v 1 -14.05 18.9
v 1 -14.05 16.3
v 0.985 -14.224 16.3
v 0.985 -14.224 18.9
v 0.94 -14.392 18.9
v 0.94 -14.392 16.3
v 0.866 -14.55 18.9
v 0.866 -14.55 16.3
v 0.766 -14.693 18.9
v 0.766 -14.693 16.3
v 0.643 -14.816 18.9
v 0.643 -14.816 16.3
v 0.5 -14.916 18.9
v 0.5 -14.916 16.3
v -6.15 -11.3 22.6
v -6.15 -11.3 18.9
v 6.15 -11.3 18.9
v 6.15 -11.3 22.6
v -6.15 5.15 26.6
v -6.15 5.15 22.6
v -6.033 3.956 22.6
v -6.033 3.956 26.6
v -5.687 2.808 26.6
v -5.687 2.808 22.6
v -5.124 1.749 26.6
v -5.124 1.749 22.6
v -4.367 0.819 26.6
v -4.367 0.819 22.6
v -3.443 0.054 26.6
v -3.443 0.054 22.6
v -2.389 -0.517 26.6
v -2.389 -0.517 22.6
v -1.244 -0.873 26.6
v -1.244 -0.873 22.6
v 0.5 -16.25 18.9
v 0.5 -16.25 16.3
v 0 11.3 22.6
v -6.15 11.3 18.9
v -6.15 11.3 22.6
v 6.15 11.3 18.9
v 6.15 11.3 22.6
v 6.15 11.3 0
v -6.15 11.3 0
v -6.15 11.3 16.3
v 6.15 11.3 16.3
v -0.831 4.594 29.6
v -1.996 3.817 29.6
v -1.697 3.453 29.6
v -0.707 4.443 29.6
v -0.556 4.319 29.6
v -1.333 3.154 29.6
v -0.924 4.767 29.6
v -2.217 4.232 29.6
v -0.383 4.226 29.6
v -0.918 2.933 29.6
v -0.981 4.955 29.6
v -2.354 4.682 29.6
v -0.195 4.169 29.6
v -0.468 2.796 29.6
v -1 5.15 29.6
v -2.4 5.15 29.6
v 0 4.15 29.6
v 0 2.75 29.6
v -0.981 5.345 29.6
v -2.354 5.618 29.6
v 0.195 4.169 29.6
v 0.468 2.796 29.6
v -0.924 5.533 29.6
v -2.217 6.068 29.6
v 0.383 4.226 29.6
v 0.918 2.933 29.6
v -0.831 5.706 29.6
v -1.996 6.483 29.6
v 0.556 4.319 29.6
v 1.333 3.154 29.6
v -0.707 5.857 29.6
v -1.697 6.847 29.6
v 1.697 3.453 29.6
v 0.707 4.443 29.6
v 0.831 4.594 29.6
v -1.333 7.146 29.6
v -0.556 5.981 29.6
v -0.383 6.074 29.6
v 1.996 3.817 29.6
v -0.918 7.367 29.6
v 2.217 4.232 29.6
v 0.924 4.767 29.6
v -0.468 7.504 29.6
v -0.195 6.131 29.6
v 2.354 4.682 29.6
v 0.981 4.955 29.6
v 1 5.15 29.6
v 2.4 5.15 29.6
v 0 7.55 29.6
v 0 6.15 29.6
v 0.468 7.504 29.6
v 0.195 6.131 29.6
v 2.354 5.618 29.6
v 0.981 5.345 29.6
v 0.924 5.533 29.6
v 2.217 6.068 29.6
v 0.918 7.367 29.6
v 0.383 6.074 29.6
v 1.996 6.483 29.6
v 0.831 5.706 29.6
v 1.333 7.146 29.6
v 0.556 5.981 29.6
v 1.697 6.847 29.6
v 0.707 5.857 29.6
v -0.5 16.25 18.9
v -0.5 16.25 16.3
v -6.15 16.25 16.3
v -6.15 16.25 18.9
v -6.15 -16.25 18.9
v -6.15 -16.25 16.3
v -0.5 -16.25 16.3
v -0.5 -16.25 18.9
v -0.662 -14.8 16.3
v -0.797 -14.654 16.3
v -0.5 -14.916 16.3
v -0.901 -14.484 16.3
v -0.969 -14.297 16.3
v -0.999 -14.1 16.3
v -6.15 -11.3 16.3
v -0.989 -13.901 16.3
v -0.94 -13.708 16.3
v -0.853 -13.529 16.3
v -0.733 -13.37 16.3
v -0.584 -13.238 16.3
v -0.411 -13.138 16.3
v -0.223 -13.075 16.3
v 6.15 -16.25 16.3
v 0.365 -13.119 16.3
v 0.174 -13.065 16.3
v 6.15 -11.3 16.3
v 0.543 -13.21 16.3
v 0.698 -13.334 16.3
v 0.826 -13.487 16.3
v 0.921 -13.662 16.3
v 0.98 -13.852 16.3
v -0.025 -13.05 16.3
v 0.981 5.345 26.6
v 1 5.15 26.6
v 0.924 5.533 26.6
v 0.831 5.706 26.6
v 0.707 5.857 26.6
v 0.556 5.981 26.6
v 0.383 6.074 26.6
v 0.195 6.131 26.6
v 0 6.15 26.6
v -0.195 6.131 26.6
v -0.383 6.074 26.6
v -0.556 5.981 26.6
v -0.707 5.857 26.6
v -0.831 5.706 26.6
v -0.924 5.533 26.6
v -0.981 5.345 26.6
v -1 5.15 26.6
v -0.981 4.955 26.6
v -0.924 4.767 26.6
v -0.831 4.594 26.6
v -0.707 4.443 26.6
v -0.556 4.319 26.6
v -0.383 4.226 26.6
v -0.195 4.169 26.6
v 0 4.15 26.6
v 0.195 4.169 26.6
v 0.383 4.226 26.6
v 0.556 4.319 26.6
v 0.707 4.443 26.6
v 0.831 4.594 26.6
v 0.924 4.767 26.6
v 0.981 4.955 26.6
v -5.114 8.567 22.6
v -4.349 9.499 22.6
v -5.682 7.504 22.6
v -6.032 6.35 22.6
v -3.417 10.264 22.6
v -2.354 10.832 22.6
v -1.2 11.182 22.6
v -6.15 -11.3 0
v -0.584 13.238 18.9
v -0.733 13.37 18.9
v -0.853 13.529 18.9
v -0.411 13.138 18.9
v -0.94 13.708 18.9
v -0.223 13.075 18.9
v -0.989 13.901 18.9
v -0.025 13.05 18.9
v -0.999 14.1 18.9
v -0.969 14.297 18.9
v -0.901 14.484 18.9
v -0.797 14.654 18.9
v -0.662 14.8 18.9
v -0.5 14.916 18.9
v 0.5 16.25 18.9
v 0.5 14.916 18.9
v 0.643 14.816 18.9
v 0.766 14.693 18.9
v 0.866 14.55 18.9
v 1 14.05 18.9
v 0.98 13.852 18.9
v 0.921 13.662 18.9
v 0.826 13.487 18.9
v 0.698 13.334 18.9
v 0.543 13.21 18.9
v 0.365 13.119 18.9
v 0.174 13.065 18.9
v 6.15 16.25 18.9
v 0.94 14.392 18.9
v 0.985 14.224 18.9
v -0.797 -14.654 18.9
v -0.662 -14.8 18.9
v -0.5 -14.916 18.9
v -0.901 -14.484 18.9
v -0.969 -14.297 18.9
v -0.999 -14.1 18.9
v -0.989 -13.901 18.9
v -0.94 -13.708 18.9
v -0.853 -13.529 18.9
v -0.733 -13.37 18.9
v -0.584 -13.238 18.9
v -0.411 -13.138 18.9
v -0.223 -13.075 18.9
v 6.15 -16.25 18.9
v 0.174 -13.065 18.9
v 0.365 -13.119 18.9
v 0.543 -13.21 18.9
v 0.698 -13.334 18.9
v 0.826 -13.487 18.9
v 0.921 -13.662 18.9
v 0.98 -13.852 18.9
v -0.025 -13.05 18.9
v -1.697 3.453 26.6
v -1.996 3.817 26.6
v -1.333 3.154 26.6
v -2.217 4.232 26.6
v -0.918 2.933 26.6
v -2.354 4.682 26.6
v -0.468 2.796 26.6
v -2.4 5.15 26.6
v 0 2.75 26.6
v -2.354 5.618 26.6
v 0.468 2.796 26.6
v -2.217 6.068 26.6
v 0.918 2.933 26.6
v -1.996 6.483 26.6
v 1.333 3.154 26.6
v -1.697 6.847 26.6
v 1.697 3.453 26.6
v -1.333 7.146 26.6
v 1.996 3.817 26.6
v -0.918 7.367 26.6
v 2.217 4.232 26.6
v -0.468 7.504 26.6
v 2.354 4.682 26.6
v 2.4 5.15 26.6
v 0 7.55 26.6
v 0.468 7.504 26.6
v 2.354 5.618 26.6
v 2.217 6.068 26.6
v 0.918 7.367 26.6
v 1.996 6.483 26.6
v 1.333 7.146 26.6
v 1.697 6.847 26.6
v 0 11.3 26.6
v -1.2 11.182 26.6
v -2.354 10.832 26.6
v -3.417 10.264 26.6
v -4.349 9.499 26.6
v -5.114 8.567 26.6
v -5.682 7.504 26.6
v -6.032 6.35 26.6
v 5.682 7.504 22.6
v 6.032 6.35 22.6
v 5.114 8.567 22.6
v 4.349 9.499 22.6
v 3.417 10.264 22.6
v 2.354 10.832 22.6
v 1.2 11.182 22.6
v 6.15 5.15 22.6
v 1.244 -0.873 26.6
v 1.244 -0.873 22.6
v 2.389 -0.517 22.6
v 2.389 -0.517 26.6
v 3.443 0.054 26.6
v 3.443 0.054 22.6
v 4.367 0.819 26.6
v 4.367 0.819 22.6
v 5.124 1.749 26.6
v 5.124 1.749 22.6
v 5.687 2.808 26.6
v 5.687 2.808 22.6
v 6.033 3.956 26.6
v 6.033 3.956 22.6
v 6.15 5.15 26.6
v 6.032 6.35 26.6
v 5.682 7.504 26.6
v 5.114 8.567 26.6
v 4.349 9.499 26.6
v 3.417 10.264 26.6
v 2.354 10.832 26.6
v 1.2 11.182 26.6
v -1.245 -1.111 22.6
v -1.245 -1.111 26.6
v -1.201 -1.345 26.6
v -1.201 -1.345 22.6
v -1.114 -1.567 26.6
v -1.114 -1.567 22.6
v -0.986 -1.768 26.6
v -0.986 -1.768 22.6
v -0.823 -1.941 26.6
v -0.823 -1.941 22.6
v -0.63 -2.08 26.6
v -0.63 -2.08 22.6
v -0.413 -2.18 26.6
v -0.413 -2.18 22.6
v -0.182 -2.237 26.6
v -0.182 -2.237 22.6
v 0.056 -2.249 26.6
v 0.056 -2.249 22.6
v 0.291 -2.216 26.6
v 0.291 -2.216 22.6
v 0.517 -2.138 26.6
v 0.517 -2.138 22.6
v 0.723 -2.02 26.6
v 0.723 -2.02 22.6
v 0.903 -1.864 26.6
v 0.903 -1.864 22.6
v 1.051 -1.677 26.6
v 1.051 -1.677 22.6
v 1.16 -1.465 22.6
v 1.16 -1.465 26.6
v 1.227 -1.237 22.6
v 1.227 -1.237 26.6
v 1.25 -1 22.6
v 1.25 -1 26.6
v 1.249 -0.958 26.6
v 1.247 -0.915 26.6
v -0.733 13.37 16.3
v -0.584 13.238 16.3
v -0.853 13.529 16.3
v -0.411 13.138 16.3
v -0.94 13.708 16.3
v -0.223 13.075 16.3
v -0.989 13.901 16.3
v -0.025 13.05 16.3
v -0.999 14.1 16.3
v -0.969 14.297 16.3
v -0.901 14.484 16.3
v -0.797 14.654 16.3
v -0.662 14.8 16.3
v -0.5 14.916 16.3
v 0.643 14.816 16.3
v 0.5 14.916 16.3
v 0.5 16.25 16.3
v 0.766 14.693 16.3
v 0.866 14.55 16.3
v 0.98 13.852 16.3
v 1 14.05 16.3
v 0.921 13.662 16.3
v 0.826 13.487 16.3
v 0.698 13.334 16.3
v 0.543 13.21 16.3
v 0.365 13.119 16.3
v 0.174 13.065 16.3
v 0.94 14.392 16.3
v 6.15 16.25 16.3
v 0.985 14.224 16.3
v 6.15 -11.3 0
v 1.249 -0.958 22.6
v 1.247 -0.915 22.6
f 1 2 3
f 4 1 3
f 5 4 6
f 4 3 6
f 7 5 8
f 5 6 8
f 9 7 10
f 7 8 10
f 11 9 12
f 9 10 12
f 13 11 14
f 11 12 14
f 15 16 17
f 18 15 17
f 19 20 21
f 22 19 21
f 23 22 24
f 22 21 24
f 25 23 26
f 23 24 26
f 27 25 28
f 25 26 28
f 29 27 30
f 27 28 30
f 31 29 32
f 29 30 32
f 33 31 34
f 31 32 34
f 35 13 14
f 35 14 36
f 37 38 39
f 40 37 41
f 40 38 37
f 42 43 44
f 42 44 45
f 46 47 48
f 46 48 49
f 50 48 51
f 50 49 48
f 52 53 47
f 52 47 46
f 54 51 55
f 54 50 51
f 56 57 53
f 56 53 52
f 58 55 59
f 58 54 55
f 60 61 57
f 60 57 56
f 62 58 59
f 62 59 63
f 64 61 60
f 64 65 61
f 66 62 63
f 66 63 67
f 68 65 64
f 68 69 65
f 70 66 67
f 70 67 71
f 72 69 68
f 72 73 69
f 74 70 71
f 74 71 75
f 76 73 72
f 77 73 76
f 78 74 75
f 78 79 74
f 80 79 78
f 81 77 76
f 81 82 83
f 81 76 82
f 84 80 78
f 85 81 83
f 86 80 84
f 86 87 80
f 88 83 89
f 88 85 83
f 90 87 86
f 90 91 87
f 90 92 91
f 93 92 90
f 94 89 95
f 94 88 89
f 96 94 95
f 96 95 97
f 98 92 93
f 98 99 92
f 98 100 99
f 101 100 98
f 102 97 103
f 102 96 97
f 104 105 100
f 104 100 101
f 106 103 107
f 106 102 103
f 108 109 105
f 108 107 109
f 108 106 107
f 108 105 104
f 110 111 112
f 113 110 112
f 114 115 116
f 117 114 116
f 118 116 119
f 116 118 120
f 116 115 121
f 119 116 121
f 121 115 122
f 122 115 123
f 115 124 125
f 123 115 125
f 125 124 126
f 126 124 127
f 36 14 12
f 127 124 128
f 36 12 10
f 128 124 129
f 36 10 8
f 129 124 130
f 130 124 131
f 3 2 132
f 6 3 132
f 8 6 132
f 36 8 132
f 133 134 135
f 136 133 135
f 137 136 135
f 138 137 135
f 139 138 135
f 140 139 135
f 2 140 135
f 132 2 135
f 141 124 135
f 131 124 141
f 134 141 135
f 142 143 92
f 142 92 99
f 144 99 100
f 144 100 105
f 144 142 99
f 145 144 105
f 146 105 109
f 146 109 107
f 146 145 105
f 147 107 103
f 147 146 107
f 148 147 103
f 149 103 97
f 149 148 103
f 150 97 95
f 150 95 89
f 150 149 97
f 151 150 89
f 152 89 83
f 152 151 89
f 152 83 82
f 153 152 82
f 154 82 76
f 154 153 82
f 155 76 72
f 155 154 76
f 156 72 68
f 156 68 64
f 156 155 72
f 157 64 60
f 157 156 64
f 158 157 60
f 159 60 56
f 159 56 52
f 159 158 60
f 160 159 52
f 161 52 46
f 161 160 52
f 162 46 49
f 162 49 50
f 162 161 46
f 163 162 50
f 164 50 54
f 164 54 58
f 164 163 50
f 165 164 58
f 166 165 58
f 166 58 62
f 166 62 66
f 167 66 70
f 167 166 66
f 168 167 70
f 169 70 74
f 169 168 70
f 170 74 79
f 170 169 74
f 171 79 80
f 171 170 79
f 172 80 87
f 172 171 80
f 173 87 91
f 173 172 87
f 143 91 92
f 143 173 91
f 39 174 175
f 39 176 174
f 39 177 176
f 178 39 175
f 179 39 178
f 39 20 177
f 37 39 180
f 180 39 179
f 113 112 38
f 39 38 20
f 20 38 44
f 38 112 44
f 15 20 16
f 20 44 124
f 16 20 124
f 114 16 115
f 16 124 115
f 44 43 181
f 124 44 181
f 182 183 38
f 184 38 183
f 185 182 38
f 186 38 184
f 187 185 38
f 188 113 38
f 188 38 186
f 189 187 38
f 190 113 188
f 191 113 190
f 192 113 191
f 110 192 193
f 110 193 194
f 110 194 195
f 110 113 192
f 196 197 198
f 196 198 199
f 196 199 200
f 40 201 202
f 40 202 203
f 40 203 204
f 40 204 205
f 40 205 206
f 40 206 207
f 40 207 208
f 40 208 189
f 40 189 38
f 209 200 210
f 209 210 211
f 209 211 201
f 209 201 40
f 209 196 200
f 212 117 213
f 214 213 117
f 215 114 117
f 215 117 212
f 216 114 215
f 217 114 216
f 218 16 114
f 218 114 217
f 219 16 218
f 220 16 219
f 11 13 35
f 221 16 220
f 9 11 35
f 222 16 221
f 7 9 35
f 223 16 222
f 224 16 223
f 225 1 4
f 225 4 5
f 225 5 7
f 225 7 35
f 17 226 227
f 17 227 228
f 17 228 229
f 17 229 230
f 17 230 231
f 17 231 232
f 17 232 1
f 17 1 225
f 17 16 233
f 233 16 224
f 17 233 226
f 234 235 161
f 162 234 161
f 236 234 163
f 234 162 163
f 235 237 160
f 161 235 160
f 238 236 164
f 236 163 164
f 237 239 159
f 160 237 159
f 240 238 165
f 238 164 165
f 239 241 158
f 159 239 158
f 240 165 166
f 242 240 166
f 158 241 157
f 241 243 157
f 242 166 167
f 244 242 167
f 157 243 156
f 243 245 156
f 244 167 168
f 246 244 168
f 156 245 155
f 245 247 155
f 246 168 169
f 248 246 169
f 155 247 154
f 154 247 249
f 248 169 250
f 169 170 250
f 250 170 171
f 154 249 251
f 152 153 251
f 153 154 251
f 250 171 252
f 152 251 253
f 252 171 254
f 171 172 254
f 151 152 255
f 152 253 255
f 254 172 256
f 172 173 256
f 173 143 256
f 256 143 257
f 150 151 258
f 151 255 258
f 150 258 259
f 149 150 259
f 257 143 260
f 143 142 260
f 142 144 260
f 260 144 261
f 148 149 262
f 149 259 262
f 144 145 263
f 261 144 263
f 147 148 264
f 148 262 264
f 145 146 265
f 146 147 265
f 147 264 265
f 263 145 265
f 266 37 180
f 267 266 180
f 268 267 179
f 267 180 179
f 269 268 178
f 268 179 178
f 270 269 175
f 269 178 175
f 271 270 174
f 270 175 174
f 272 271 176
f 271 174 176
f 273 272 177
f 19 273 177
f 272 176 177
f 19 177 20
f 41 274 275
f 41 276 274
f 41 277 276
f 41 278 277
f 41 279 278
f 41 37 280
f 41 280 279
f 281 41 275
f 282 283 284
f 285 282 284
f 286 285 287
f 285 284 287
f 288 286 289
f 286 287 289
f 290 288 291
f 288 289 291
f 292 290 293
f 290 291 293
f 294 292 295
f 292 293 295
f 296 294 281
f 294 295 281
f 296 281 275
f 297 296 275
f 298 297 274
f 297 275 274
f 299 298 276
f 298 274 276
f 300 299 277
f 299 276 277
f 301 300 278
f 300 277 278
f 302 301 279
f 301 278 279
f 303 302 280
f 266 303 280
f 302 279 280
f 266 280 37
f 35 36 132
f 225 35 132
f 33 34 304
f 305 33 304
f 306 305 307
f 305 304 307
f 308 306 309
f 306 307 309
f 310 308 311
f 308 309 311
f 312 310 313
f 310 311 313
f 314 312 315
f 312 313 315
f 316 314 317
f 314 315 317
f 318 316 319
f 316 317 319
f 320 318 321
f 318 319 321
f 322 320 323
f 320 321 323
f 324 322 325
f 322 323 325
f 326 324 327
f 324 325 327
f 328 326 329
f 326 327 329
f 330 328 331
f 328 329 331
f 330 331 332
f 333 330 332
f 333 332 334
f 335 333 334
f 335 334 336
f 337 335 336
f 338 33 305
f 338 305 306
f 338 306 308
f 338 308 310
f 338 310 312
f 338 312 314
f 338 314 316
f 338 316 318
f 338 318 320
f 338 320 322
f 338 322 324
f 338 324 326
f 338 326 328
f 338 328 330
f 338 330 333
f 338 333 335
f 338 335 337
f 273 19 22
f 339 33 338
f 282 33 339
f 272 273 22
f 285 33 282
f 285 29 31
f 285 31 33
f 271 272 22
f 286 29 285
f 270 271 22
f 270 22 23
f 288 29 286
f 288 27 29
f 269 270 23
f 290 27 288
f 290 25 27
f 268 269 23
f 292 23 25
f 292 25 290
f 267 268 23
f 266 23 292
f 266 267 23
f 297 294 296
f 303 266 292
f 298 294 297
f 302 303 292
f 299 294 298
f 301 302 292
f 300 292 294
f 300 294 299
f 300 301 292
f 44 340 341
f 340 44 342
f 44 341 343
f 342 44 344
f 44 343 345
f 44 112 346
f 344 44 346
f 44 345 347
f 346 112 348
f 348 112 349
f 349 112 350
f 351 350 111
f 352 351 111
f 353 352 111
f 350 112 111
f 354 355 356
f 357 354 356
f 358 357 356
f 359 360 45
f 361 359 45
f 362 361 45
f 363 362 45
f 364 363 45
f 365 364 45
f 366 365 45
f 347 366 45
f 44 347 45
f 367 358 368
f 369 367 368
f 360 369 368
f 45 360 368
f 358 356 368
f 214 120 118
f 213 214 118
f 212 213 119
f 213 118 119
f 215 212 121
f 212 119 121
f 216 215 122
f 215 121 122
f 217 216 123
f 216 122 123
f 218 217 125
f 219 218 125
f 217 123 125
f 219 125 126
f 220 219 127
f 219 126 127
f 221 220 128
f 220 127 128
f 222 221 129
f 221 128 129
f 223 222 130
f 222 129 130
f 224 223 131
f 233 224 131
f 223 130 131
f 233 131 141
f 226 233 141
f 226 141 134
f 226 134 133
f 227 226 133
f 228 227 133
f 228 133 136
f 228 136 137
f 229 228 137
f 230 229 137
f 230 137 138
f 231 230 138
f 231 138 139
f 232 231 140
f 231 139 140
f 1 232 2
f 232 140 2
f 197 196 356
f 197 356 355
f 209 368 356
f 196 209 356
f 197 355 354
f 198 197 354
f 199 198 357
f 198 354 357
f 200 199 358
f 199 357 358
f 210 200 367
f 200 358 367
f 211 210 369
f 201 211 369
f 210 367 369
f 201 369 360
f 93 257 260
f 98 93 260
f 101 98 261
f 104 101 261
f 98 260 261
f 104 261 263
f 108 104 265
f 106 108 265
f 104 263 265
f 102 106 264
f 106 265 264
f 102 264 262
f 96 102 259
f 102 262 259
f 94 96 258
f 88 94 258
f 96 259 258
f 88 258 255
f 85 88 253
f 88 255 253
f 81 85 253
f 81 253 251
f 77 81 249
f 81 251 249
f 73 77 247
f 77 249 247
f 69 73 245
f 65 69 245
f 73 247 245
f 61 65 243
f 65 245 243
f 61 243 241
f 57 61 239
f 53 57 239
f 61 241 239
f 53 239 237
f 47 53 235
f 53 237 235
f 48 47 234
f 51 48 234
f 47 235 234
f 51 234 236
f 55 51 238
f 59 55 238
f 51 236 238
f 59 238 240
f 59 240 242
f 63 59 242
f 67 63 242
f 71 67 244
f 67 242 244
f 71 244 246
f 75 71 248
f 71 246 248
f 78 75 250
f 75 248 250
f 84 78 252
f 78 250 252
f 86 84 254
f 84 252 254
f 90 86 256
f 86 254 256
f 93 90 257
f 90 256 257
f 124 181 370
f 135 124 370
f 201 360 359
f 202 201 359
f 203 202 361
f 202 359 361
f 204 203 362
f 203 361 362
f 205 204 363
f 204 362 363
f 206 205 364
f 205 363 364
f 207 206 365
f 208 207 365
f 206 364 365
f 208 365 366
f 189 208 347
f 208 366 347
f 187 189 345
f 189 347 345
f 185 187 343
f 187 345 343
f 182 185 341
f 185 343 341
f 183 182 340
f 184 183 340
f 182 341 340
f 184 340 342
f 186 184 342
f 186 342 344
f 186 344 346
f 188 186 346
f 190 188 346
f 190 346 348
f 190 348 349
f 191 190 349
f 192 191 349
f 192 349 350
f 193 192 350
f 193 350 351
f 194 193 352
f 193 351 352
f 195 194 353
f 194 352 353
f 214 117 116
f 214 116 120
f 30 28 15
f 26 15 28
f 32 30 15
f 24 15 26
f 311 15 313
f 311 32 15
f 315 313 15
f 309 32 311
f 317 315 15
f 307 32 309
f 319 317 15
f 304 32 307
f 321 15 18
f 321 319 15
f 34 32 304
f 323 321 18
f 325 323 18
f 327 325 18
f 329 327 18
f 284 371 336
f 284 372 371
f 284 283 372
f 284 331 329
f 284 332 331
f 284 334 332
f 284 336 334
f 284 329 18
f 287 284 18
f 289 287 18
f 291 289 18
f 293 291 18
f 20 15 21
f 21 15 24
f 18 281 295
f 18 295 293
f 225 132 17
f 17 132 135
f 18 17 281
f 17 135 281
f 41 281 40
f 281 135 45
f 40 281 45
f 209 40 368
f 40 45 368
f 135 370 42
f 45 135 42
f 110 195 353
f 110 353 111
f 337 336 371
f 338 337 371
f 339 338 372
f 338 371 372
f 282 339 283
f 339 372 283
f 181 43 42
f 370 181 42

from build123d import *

# Parameters (mm, degrees)
F0_W     = 12.3
F0_H     = 22.6
F1_DEPTH = 16.3
F2_W     = 12.3
F2_H     = 22.6
F3_DEPTH = 2.6
F4_W     = 12.3
F4_H     = 22.6
F5_DEPTH = 3.7
F7_DEPTH = 4
F8_R     = 2.4
F8_R_2   = 1
F9_DEPTH = 3


with BuildPart() as f1:
    # F0 (on Top) → F1 (new body)
    with BuildSketch(Plane.XY):
        Rectangle(F0_W, F0_H)
    extrude(amount=F1_DEPTH)

    # F2 (on face) → F3 (join)
    with BuildSketch(Plane.XY.offset(16.3)):
        with BuildLine():
            Line((-6.15, 16.25), (-6.15, 11.3))
            Line((-6.15, 11.3), (6.15, 11.3))
            Line((6.15, 11.3), (6.15, 16.25))
            Line((6.15, 16.25), (0.5, 16.25))
            Line((0.5, 16.25), (0.5, 14.9160254038))
            ThreePointArc((0.5, 14.9160254038), (0.8660254038, 14.55), (1, 14.05))
            ThreePointArc((1, 14.05), (-0.5, 13.1839745962), (-0.5, 14.9160254038))
            Line((-0.5, 14.9160254038), (-0.5, 16.25))
            Line((-0.5, 16.25), (-6.15, 16.25))
        make_face()
        Rectangle(F2_W, F2_H)
        with BuildLine():
            Line((6.15, -11.3), (-6.15, -11.3))
            Line((-6.15, -11.3), (-6.15, -16.25))
            Line((-6.15, -16.25), (-0.5, -16.25))
            Line((-0.5, -16.25), (-0.5, -14.9160254038))
            ThreePointArc((-0.5, -14.9160254038), (-0.5, -13.1839745962), (1, -14.05))
            ThreePointArc((1, -14.05), (0.8660254038, -14.55), (0.5, -14.9160254038))
            Line((0.5, -14.9160254038), (0.5, -16.25))
            Line((0.5, -16.25), (6.15, -16.25))
            Line((6.15, -16.25), (6.15, -11.3))
        make_face()
    extrude(amount=F3_DEPTH)

    # F4 (on face) → F5 (join)
    with BuildSketch(Plane.XY.offset(18.9)):
        Rectangle(F4_W, F4_H)
    extrude(amount=F5_DEPTH)

    # F6 (on face) → F7 (join)
    with BuildSketch(Plane.XY.offset(22.6)):
        with BuildLine():
            ThreePointArc((1.2435283426, -0.8729674797), (4.7681337705, 1.265749706), (6.15, 5.15))
            ThreePointArc((6.15, 5.15), (4.3487067043, 9.4987067043), (0, 11.3))
            ThreePointArc((0, 11.3), (-4.3487067043, 9.4987067043), (-6.15, 5.15))
            ThreePointArc((-6.15, 5.15), (-4.7681337705, 1.265749706), (-1.2435283426, -0.8729674797))
            ThreePointArc((-1.2435283426, -0.8729674797), (0, 0.25), (1.2435283426, -0.8729674797))
        make_face()
        with BuildLine():
            ThreePointArc((1.25, -1), (1.2483810372, -0.9364013688), (1.2435283426, -0.8729674797))
            ThreePointArc((1.2435283426, -0.8729674797), (0, -1), (-1.2435283426, -0.8729674797))
            ThreePointArc((-1.2435283426, -0.8729674797), (-0.0635986312, -2.2483810372), (1.25, -1))
        make_face()
        with BuildLine():
            ThreePointArc((-1.2435283426, -0.8729674797), (0, -1), (1.2435283426, -0.8729674797))
            ThreePointArc((1.2435283426, -0.8729674797), (0, 0.25), (-1.2435283426, -0.8729674797))
        make_face()
    extrude(amount=F7_DEPTH)


with BuildPart() as f9:
    # F8 (on face) → F9 (new body)
    with BuildSketch(Plane.XY.offset(26.6)):
        with Locations((0, 5.15)):
            Circle(F8_R)
        with Locations((0, 5.15)):
            Circle(F8_R_2, mode=Mode.SUBTRACT)
    extrude(amount=F9_DEPTH)


solid = Compound([f1.part, f9.part])
